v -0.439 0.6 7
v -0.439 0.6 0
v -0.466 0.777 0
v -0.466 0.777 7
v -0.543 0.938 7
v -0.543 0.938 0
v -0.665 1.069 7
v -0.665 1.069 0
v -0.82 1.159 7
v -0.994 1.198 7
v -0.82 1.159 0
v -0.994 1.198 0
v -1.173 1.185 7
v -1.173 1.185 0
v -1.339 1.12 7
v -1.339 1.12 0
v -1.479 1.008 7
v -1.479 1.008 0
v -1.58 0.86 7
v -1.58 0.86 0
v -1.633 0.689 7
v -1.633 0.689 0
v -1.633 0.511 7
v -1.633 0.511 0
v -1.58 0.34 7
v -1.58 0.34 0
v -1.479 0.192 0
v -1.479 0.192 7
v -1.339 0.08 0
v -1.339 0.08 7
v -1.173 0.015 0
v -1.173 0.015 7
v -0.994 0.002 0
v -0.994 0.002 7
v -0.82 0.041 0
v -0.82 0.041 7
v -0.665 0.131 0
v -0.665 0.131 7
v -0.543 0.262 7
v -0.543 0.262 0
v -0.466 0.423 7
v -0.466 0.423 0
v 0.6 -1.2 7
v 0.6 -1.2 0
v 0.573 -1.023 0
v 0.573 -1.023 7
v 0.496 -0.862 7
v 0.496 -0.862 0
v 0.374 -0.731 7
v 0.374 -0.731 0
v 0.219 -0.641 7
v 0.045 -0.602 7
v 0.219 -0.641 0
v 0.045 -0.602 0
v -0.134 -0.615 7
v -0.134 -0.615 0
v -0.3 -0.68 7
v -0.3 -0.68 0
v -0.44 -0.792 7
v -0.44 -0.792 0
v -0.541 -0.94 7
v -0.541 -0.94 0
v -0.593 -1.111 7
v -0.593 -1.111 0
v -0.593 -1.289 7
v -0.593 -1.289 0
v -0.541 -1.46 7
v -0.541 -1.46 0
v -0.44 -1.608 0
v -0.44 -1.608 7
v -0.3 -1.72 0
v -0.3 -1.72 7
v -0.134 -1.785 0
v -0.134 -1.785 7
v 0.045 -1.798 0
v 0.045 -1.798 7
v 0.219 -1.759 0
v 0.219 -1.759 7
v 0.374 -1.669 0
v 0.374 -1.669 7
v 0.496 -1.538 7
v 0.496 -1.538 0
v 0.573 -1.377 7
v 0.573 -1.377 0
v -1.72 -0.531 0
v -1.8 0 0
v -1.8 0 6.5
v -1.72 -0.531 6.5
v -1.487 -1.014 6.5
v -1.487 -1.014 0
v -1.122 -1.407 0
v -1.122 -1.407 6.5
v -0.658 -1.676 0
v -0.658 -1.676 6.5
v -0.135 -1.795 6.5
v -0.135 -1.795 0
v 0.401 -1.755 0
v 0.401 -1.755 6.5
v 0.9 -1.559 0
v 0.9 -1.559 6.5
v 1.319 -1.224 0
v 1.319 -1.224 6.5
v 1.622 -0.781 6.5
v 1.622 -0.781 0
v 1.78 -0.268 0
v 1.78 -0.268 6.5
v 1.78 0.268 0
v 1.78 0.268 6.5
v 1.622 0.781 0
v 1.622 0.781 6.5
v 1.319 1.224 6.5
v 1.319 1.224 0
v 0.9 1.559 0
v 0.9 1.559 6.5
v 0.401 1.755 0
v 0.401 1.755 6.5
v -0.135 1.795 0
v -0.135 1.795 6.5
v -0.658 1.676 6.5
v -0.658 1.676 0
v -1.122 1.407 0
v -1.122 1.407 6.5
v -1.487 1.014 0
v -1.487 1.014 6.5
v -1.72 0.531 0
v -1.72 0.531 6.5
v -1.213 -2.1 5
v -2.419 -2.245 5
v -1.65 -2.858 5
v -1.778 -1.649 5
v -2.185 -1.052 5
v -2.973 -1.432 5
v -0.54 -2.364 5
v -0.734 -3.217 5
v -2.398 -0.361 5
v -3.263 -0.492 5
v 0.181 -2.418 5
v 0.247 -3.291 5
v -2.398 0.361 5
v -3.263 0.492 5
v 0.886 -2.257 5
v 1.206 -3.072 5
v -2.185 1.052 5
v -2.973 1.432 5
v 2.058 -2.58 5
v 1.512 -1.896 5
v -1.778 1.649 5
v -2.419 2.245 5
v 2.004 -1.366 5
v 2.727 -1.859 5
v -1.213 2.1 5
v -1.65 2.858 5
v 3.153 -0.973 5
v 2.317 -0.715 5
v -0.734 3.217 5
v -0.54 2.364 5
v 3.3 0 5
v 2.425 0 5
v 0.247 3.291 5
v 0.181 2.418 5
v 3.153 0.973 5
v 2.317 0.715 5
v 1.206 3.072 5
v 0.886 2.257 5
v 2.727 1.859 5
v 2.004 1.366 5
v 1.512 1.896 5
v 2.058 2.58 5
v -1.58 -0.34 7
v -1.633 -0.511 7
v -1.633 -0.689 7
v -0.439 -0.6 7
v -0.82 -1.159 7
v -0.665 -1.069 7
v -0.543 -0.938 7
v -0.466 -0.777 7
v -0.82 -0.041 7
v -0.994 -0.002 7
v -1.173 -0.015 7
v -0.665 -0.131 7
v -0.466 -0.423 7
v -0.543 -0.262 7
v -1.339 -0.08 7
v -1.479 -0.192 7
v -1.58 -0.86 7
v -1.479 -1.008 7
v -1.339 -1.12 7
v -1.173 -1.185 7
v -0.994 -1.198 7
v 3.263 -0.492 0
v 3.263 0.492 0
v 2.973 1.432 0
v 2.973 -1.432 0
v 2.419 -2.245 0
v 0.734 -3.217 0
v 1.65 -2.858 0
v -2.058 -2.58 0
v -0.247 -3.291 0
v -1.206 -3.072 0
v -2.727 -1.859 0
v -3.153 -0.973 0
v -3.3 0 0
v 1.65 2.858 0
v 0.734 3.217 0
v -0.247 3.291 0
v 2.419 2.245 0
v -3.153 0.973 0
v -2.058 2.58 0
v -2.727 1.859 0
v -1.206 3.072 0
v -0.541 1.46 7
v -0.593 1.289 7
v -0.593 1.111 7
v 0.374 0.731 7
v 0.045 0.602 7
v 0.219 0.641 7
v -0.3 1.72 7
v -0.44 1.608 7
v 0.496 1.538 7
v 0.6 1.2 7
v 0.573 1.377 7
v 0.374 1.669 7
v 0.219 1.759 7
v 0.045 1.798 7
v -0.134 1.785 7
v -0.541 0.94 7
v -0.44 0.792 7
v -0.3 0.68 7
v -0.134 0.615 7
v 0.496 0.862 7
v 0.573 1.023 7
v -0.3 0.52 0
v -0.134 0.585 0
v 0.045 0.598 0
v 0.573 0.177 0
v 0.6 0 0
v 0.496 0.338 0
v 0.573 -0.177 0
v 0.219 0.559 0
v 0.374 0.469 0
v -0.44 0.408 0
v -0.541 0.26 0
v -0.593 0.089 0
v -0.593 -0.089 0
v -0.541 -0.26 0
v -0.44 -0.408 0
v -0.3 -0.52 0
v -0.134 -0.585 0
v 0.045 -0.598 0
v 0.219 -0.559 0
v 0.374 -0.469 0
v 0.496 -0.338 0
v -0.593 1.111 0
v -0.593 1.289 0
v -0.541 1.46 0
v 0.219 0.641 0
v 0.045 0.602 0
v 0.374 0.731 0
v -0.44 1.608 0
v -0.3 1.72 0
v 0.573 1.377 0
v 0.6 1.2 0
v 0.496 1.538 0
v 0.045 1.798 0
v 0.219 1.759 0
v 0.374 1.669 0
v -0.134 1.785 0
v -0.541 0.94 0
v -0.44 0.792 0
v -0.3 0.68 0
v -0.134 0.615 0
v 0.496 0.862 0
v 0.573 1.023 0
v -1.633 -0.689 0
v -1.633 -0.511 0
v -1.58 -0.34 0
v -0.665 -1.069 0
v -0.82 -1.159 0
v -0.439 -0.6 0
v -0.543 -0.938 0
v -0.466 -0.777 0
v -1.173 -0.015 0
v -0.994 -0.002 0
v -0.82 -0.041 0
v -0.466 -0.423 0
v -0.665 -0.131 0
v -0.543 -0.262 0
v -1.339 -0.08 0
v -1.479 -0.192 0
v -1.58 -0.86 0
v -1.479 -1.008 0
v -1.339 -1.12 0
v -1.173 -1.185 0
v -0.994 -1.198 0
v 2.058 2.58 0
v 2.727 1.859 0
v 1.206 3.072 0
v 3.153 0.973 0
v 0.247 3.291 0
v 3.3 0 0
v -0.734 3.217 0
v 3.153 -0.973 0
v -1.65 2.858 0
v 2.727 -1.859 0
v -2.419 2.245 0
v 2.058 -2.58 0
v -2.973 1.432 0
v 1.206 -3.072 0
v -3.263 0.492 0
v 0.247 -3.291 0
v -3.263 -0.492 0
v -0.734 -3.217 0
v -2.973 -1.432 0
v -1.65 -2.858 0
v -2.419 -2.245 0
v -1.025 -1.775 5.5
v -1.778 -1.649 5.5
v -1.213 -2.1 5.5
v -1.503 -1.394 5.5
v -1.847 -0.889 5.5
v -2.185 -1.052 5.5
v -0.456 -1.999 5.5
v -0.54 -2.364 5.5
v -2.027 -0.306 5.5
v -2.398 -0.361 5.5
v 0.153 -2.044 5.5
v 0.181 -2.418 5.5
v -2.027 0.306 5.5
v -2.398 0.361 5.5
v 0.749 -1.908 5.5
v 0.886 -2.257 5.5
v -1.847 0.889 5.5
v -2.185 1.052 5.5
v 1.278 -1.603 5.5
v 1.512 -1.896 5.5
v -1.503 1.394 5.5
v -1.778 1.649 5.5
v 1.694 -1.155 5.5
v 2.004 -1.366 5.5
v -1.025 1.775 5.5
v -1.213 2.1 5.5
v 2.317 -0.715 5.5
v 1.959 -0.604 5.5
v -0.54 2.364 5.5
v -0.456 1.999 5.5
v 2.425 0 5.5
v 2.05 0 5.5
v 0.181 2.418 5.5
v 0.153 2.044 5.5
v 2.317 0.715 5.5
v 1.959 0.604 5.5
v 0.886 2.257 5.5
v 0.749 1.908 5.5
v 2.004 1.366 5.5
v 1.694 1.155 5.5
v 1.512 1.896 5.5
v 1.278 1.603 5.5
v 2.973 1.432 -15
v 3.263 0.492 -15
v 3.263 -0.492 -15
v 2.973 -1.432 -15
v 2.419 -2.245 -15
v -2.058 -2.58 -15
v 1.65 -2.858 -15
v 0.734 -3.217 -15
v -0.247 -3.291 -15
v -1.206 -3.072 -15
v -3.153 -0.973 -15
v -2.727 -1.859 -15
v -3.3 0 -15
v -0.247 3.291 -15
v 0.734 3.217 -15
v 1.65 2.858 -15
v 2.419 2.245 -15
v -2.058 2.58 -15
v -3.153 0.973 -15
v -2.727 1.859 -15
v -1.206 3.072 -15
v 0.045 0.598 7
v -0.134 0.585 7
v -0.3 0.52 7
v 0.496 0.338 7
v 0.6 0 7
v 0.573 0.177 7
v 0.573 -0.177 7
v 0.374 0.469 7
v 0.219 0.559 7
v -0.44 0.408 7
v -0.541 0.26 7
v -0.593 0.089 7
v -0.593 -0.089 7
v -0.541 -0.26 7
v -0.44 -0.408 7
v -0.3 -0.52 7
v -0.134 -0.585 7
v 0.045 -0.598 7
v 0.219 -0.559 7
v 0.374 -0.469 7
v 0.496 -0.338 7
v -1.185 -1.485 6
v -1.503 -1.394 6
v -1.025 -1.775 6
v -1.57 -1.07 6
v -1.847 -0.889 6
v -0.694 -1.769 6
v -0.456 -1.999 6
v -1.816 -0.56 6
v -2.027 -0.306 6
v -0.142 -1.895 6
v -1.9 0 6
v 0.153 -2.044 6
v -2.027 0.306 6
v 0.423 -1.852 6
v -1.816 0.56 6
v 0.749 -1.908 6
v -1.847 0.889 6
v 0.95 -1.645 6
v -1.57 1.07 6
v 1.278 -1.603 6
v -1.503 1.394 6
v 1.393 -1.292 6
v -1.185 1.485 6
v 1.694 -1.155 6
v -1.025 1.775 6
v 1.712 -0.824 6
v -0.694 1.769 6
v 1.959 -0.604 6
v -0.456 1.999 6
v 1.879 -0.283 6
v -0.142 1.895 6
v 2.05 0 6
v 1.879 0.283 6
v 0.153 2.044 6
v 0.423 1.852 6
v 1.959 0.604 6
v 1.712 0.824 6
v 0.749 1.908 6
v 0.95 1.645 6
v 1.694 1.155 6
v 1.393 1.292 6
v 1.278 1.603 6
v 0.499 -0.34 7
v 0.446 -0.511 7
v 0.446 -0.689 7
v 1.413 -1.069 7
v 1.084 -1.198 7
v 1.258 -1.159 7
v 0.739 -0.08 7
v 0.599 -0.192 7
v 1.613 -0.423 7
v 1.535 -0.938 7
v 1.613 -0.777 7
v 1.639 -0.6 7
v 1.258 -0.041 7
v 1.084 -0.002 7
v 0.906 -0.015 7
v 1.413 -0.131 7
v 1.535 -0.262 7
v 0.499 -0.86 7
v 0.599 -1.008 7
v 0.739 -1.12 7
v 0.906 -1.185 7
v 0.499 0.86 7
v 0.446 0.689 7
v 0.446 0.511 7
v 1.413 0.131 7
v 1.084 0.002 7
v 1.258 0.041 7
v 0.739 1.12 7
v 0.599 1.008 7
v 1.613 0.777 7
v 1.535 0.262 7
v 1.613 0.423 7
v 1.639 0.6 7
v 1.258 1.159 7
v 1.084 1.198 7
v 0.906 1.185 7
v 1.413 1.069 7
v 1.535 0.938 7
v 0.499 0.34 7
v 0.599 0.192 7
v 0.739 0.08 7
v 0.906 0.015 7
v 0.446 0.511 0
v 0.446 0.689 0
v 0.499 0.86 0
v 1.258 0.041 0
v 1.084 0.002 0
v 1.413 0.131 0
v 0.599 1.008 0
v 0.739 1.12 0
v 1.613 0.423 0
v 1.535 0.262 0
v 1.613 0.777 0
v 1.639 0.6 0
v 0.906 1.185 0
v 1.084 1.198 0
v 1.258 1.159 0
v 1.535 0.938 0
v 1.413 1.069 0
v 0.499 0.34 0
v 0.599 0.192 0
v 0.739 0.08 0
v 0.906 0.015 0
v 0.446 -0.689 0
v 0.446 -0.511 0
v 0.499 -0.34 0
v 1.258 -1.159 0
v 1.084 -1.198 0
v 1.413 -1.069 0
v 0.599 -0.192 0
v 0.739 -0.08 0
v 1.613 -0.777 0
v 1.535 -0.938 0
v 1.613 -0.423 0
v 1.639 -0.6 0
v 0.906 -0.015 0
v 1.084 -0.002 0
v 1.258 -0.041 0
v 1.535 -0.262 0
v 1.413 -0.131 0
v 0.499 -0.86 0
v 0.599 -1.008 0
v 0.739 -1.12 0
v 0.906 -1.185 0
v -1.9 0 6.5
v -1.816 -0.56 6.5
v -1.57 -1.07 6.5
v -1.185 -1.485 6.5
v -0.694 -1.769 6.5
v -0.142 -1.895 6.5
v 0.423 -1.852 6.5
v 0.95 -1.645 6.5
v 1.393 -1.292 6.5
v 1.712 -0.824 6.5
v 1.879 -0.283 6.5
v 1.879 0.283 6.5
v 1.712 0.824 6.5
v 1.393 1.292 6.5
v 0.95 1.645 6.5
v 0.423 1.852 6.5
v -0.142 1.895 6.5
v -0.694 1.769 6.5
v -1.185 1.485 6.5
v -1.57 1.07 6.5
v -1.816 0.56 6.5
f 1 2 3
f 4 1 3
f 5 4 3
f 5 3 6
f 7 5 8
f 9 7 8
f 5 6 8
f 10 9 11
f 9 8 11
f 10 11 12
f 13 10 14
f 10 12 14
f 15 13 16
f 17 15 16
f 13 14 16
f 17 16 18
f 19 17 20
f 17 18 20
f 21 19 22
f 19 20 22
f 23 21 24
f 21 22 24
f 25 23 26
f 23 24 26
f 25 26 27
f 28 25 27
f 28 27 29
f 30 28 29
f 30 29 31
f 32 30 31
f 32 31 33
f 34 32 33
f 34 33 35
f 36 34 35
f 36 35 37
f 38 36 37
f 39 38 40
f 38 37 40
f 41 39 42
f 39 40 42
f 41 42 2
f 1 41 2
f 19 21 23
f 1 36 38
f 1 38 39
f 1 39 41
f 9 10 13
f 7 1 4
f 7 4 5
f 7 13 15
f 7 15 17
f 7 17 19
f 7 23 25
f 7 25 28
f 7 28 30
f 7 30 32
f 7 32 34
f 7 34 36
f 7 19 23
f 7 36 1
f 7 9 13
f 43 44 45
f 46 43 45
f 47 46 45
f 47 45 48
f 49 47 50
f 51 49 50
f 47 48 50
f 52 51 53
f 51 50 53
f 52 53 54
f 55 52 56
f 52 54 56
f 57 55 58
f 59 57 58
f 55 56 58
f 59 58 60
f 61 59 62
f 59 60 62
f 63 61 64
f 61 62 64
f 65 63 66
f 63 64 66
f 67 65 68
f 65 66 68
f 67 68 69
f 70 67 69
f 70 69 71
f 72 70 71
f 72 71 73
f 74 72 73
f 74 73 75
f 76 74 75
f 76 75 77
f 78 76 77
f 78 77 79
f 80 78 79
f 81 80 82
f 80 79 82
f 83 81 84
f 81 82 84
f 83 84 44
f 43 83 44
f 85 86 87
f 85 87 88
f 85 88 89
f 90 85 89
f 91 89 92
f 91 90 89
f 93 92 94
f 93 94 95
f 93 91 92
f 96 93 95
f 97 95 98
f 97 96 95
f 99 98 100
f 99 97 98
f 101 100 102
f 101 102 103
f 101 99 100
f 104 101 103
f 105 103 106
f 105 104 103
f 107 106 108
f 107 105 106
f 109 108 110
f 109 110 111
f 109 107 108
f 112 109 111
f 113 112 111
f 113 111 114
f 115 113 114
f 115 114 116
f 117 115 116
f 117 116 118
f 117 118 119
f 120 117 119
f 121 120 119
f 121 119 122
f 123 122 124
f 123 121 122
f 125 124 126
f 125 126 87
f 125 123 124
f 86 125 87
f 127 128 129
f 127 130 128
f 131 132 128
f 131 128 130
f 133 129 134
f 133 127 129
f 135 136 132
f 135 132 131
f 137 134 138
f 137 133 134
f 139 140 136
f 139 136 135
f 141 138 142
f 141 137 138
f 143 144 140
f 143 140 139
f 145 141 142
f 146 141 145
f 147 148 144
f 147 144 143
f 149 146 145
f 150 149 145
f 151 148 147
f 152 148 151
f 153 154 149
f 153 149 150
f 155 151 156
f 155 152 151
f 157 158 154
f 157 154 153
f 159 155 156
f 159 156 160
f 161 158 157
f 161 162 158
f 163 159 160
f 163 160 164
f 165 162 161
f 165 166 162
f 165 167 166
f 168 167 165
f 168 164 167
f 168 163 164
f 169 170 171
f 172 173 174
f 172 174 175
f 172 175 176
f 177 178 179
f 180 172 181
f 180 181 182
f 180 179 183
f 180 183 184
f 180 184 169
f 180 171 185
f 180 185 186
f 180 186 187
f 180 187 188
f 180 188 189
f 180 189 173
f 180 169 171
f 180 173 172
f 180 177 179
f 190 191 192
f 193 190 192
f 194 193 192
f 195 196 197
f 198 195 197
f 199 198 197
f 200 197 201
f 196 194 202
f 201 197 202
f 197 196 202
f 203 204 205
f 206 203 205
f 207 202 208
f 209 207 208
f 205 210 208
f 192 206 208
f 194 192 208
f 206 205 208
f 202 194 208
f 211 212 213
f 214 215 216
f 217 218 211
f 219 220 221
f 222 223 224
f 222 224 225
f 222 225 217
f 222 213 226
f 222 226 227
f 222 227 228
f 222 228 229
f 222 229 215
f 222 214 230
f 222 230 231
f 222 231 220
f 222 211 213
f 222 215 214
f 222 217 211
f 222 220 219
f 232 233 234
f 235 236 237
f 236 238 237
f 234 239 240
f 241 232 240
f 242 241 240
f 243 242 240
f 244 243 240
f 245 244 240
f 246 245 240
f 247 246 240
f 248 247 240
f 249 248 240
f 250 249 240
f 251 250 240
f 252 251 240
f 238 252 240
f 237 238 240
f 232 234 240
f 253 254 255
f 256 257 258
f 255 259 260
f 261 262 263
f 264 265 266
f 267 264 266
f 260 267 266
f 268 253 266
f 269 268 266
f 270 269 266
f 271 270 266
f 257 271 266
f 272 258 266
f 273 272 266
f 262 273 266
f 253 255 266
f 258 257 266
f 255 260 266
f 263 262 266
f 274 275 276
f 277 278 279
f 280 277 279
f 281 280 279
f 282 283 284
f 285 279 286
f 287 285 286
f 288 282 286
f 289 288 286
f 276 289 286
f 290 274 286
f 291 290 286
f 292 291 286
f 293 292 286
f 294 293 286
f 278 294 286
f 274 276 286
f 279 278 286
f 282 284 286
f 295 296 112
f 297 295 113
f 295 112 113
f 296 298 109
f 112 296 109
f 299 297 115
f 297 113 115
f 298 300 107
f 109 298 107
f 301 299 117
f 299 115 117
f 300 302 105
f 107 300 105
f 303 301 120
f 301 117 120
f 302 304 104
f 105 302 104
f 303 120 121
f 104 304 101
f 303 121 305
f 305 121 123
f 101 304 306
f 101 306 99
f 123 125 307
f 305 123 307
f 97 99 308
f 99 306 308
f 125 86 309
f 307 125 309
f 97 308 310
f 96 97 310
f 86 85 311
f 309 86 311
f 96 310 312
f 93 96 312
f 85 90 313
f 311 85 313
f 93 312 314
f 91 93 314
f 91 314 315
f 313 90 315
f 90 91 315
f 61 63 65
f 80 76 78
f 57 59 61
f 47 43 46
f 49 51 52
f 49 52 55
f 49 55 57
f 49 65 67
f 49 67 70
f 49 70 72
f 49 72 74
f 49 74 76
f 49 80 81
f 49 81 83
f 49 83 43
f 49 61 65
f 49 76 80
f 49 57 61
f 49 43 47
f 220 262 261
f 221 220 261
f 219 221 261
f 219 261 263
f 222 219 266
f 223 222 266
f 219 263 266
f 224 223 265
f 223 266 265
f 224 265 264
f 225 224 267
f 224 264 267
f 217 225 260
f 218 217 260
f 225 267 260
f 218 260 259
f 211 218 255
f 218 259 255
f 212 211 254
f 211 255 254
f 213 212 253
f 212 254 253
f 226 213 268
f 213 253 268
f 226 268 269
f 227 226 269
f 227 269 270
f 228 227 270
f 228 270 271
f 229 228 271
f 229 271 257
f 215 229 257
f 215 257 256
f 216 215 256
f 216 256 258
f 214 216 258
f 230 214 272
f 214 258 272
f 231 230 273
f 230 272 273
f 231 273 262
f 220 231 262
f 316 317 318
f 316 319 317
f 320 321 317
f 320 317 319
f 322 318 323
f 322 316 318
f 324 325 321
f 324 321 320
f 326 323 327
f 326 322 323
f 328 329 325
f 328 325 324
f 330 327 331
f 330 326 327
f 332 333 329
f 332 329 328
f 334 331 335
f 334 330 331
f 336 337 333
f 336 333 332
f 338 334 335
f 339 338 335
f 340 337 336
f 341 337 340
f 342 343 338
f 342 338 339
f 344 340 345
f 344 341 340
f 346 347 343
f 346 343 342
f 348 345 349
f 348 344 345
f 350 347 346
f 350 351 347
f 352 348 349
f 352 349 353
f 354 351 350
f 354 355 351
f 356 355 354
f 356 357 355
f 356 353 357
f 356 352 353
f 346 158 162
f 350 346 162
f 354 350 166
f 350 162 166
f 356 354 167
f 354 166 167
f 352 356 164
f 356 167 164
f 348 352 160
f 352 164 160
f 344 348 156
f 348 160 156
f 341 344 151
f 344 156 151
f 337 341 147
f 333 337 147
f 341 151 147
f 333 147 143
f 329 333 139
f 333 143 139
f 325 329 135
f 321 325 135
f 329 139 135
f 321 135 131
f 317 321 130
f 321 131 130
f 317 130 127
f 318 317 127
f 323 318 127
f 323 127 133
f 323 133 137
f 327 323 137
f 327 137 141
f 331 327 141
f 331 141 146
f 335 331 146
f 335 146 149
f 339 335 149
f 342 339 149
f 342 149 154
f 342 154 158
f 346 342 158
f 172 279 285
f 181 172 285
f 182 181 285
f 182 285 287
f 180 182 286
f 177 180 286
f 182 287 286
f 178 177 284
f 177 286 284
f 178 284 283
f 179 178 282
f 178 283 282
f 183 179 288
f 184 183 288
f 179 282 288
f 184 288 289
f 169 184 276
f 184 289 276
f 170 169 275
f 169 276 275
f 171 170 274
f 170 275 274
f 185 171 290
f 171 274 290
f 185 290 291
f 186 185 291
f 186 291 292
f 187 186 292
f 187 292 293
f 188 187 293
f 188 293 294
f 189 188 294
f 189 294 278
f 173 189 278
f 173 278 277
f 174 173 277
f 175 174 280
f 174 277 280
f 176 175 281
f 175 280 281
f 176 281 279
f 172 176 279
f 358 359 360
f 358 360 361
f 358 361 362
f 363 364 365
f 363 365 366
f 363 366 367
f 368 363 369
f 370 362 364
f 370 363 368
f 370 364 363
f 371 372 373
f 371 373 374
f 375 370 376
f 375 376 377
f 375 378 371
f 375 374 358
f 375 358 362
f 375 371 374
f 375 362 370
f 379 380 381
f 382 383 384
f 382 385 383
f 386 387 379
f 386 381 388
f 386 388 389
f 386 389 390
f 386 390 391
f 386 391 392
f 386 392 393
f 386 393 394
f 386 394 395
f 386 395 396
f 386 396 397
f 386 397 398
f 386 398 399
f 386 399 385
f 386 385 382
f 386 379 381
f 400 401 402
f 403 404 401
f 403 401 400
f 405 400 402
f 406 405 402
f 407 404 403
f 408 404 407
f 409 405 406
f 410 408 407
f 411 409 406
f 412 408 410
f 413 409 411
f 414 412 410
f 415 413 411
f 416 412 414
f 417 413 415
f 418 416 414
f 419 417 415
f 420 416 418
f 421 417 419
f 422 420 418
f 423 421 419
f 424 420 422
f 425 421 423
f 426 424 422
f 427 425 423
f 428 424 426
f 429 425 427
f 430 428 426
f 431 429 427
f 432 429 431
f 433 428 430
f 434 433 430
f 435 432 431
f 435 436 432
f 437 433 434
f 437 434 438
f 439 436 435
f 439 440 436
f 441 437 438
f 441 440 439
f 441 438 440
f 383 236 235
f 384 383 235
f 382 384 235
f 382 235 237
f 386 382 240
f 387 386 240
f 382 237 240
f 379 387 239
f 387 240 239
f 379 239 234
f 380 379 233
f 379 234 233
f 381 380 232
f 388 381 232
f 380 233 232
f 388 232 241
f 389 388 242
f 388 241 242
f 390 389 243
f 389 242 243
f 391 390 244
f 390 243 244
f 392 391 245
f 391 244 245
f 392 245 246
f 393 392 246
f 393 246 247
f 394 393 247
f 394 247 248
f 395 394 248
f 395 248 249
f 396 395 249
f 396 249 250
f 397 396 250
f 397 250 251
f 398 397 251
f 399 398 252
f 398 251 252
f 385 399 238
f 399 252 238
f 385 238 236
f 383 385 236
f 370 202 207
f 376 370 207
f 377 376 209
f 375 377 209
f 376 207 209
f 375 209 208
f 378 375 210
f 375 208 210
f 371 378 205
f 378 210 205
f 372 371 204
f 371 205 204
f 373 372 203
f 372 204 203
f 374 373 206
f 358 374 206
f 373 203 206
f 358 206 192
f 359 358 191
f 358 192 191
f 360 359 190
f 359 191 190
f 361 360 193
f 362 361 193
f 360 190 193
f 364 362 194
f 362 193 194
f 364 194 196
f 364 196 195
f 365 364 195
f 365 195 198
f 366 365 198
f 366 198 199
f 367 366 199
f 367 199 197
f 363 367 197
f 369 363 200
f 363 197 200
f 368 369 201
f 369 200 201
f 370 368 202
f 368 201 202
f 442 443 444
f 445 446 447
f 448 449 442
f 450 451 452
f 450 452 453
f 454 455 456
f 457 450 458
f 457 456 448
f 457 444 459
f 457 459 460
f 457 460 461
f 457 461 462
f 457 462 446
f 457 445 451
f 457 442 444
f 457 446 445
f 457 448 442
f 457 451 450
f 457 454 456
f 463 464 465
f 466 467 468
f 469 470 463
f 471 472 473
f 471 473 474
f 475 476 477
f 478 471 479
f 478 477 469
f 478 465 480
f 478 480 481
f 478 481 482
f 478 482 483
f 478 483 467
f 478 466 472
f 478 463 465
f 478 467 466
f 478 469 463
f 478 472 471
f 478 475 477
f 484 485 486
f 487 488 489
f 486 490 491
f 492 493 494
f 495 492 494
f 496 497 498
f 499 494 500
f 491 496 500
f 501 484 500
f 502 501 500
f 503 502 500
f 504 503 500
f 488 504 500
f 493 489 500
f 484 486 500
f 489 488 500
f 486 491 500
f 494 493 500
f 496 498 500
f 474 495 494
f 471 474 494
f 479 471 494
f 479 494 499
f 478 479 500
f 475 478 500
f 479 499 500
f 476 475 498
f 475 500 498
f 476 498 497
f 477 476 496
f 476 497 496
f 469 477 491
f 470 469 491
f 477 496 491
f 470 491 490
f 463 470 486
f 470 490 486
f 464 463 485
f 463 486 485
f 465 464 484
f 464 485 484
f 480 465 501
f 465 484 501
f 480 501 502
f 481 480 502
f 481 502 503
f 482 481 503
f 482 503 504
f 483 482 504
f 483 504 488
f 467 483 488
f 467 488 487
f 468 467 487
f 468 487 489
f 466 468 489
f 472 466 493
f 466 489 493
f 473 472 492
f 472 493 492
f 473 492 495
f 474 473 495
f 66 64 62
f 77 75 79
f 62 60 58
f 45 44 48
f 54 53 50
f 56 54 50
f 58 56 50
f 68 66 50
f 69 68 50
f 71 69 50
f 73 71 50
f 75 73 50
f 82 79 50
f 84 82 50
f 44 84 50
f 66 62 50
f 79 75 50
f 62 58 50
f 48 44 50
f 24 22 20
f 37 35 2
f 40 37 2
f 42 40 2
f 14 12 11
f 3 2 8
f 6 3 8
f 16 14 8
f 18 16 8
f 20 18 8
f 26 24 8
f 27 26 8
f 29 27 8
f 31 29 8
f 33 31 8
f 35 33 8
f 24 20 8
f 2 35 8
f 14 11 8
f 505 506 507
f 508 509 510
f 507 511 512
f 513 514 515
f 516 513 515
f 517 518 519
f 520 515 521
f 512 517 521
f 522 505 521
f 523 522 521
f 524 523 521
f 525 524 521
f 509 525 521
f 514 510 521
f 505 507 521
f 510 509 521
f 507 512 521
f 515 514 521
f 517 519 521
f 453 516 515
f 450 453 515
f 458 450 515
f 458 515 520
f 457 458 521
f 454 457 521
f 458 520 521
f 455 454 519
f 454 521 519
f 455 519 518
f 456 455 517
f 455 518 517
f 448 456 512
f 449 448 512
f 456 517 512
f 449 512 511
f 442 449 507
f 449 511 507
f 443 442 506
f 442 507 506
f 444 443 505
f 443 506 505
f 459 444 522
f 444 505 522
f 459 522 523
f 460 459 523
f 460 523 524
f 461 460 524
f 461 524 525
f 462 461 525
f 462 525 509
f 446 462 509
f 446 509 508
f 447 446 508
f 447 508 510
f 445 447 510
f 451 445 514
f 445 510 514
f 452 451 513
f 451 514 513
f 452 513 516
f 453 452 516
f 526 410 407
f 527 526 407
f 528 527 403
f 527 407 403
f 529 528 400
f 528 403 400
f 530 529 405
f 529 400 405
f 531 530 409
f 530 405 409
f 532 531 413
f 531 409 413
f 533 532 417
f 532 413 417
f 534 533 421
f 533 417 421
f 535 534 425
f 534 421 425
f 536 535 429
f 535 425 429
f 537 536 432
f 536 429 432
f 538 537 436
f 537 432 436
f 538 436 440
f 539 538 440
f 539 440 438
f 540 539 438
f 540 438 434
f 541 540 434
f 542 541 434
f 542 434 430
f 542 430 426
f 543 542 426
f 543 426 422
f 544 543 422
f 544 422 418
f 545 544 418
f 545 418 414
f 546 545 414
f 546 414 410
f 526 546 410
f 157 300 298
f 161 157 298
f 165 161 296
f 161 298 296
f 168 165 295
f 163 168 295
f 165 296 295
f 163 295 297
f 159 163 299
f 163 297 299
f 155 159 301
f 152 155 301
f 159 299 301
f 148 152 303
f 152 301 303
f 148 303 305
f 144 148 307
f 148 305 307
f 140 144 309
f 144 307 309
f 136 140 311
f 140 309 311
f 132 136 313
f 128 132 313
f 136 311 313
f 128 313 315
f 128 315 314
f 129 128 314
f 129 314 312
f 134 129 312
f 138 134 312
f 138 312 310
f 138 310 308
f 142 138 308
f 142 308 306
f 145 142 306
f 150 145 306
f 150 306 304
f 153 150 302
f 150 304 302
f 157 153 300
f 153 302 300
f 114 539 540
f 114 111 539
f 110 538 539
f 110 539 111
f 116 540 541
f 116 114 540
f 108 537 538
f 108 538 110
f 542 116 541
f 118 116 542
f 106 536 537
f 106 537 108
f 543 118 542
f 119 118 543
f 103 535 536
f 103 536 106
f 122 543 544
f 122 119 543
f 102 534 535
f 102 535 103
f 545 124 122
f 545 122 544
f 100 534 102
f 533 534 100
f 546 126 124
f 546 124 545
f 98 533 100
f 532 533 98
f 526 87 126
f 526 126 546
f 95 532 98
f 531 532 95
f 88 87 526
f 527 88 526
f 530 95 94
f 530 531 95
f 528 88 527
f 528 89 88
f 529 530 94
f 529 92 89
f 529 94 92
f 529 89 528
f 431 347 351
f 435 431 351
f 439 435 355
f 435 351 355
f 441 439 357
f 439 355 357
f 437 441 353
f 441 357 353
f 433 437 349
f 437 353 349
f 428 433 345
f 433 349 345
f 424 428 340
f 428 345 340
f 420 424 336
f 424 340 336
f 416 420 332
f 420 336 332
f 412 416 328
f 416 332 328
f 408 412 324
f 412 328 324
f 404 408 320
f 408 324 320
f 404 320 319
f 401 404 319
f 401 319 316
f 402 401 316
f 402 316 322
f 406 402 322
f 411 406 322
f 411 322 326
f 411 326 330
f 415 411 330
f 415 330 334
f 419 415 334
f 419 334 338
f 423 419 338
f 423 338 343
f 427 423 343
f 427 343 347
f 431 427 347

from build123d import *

# Parameters (mm, degrees)
IZIM1_R                       = 6.6
IZIM1_R_2                     = 4.85
Y_KSEKLIK_EKSTR_ZYON1_DEPTH   = 10
IZIM1_5_R                     = 4.85
IZIM1_5_R_2                   = 4.1
Y_KSEKLIK_EKSTR_ZYON2_DEPTH   = 11
IZIM1_6_R                     = 4.1
IZIM1_6_R_2                   = 3.8
Y_KSEKLIK_EKSTR_ZYON3_DEPTH   = 12
IZIM1_7_R                     = 3.8
Y_KSEKLIK_EKSTR_ZYON4_DEPTH   = 13
Y_KSEKLIK_EKSTR_ZYON5_DEPTH   = 14
Y_KSEKLIK_EKSTR_ZYON5_2_DEPTH = 14
Y_KSEKLIK_EKSTR_ZYON5_3_DEPTH = 14
Y_KSEKLIK_EKSTR_ZYON5_4_DEPTH = 14
Y_KSEKLIK_EKSTR_ZYON5_5_DEPTH = 14
Y_KSEKLIK_EKSTR_ZYON5_6_DEPTH = 14
Y_KSEKLIK_EKSTR_ZYON5_7_DEPTH = 14
L_EK6_SCALE                   = 0.5
IZIM3_R                       = 3.3
Y_KSEKLIK_EKSTR_ZYON8_DEPTH   = 15


with BuildPart() as part:
    # Çizim1 → Yükseklik-Ekstrüzyon1 (new body)
    with BuildSketch(Plane.XY):
        Circle(IZIM1_R)
        Circle(IZIM1_R_2, mode=Mode.SUBTRACT)
    extrude(amount=Y_KSEKLIK_EKSTR_ZYON1_DEPTH)

    # Çizim1<5> → Yükseklik-Ekstrüzyon2 (add)
    with BuildSketch(Plane.XY):
        Circle(IZIM1_5_R)
        Circle(IZIM1_5_R_2, mode=Mode.SUBTRACT)
    extrude(amount=Y_KSEKLIK_EKSTR_ZYON2_DEPTH)

    # Çizim1<6> → Yükseklik-Ekstrüzyon3 (add)
    with BuildSketch(Plane.XY):
        Circle(IZIM1_6_R)
        Circle(IZIM1_6_R_2, mode=Mode.SUBTRACT)
    extrude(amount=Y_KSEKLIK_EKSTR_ZYON3_DEPTH)

    # Çizim1<7> → Yükseklik-Ekstrüzyon4 (add)
    with BuildSketch(Plane.XY):
        Circle(IZIM1_7_R)
        with BuildLine():
            ThreePointArc((1e-09, 3.6), (1.799999837, 3.117691548), (3.117691265, 1.800000327))
            ThreePointArc((3.117691265, 1.800000327), (3.477332926, 0.931748744), (3.6, 0))
            ThreePointArc((3.6, 0), (3.477333, -0.931748466), (3.117691553, -1.799999828))
            ThreePointArc((3.117691553, -1.799999828), (1.800000078, -3.117691408), (-1.8e-08, -3.6))
            ThreePointArc((-1.8e-08, -3.6), (-1.800000027, -3.117691438), (-3.117691475, -1.799999962))
            ThreePointArc((-3.117691475, -1.799999962), (-3.6, 2.09e-07), (-3.117691266, 1.800000324))
            ThreePointArc((-3.117691266, 1.800000324), (-1.799999837, 3.117691547), (1e-09, 3.6))
        make_face(mode=Mode.SUBTRACT)
    extrude(amount=Y_KSEKLIK_EKSTR_ZYON4_DEPTH)


with BuildPart() as body_2:
    # Çizim1<8> → Yükseklik-Ekstrüzyon5 (new body)
    with BuildSketch(Plane.XY):
        with BuildLine():
            ThreePointArc((1.039230332, -0.600000264), (1.2, -2.6e-08), (1.039230358, 0.600000219))
            ThreePointArc((1.039230358, 0.600000219), (0.599999889, 1.039230548), (-2e-09, 1.2))
            ThreePointArc((-2e-09, 1.2), (-0.599999999, 1.039230485), (-1.039230482, 0.600000005))
            ThreePointArc((-1.039230482, 0.600000005), (-1.2, 6.3e-08), (-1.039230545, -0.599999895))
            ThreePointArc((-1.039230545, -0.599999895), (-0.600000053, -1.039230454), (0, -1.2))
            ThreePointArc((0, -1.2), (0.599999868, -1.039230561), (1.039230332, -0.600000264))
        make_face()
    extrude(amount=Y_KSEKLIK_EKSTR_ZYON5_DEPTH)


with BuildPart() as body_3:
    # Çizim1<8> → Y_kseklik-Ekstr_zyon5 2 (new body)
    with BuildSketch(Plane.XY):
        with BuildLine():
            ThreePointArc((1.039230359, 1.799999783), (0.878460969, 1.200000001), (1.039230358, 0.600000219))
            ThreePointArc((1.039230358, 0.600000219), (1.47846086, 0.160769579), (2.078460969, 0))
            ThreePointArc((2.078460969, 0), (3.117691391, 1.800000109), (1.039230359, 1.799999783))
        make_face()
    extrude(amount=Y_KSEKLIK_EKSTR_ZYON5_2_DEPTH)


with BuildPart() as body_4:
    # Çizim1<8> → Y_kseklik-Ekstr_zyon5 3 (new body)
    with BuildSketch(Plane.XY):
        with BuildLine():
            ThreePointArc((2.078460969, 0), (1.478460837, -0.160769592), (1.039230332, -0.600000264))
            ThreePointArc((1.039230332, -0.600000264), (0.878460969, -1.20000028), (1.039230612, -1.800000221))
            ThreePointArc((1.039230612, -1.800000221), (3.117691518, -1.799999889), (2.078460969, 0))
        make_face()
    extrude(amount=Y_KSEKLIK_EKSTR_ZYON5_3_DEPTH)


with BuildPart() as body_5:
    # Çizim1<8> → Y_kseklik-Ekstr_zyon5 4 (new body)
    with BuildSketch(Plane.XY):
        with BuildLine():
            ThreePointArc((-1.039230399, 1.799999852), (-0.599999927, 1.360769473), (-2e-09, 1.2))
            ThreePointArc((-2e-09, 1.2), (0.59999989, 1.360769452), (1.039230359, 1.799999783))
            ThreePointArc((1.039230359, 1.799999783), (4e-08, 3.6), (-1.039230399, 1.799999852))
        make_face()
    extrude(amount=Y_KSEKLIK_EKSTR_ZYON5_4_DEPTH)


with BuildPart() as body_6:
    # Çizim1<8> → Y_kseklik-Ekstr_zyon5 5 (new body)
    with BuildSketch(Plane.XY):
        with BuildLine():
            ThreePointArc((1.039230612, -1.800000221), (0.600000111, -1.360769579), (0, -1.2))
            ThreePointArc((0, -1.2), (-0.59999994, -1.360769481), (-1.039230415, -1.79999988))
            ThreePointArc((-1.039230415, -1.79999988), (-1.97e-07, -3.6), (1.039230612, -1.800000221))
        make_face()
    extrude(amount=Y_KSEKLIK_EKSTR_ZYON5_5_DEPTH)


with BuildPart() as body_7:
    # Çizim1<8> → Y_kseklik-Ekstr_zyon5 6 (new body)
    with BuildSketch(Plane.XY):
        with BuildLine():
            ThreePointArc((-2.078460966, 0), (-1.478460966, 0.160769517), (-1.039230482, 0.600000005))
            ThreePointArc((-1.039230482, 0.600000005), (-0.878460969, 1.199999917), (-1.039230399, 1.799999852))
            ThreePointArc((-1.039230399, 1.799999852), (-3.117691412, 1.800000073), (-2.078460966, 0))
        make_face()
    extrude(amount=Y_KSEKLIK_EKSTR_ZYON5_6_DEPTH)


with BuildPart() as body_8:
    # Çizim1<8> → Y_kseklik-Ekstr_zyon5 7 (new body)
    with BuildSketch(Plane.XY):
        with BuildLine():
            ThreePointArc((-1.039230415, -1.79999988), (-0.878460969, -1.19999987), (-1.039230545, -0.599999895))
            ThreePointArc((-1.039230545, -0.599999895), (-1.47846102, -0.160769486), (-2.078460966, 0))
            ThreePointArc((-2.078460966, 0), (-3.11769142, -1.800000059), (-1.039230415, -1.79999988))
        make_face()
    extrude(amount=Y_KSEKLIK_EKSTR_ZYON5_7_DEPTH)


with BuildPart() as body_4_1:
    # Ölçek6: scaled about (0, 0, 0)
    add(body_4.part.scale(L_EK6_SCALE))


with BuildPart() as body_6_1:
    # Ölçek6: scaled about (0, 0, 0)
    add(body_6.part.scale(L_EK6_SCALE))


with BuildPart() as body_8_1:
    # Ölçek6: scaled about (0, 0, 0)
    add(body_8.part.scale(L_EK6_SCALE))


with BuildPart() as body_7_1:
    # Ölçek6: scaled about (0, 0, 0)
    add(body_7.part.scale(L_EK6_SCALE))


with BuildPart() as body_2_1:
    # Ölçek6: scaled about (0, 0, 0)
    add(body_2.part.scale(L_EK6_SCALE))


with BuildPart() as body_3_1:
    # Ölçek6: scaled about (0, 0, 0)
    add(body_3.part.scale(L_EK6_SCALE))


with BuildPart() as body_5_1:
    # Ölçek6: scaled about (0, 0, 0)
    add(body_5.part.scale(L_EK6_SCALE))


with BuildPart() as part_1:
    # Ölçek6: scaled about (0, 0, 0)
    add(part.part.scale(L_EK6_SCALE))


with BuildPart() as body_9:
    # Çizim3 → Yükseklik-Ekstrüzyon8 (new body)
    with BuildSketch(Plane(origin=(0, 0, 0), x_dir=(-1, 0, 0), z_dir=(0, 0, -1))):
        Circle(IZIM3_R)
    extrude(amount=Y_KSEKLIK_EKSTR_ZYON8_DEPTH)


solid = Compound([body_4_1.part, body_6_1.part, body_8_1.part, body_7_1.part, body_2_1.part, body_3_1.part, body_5_1.part, part_1.part, body_9.part])
